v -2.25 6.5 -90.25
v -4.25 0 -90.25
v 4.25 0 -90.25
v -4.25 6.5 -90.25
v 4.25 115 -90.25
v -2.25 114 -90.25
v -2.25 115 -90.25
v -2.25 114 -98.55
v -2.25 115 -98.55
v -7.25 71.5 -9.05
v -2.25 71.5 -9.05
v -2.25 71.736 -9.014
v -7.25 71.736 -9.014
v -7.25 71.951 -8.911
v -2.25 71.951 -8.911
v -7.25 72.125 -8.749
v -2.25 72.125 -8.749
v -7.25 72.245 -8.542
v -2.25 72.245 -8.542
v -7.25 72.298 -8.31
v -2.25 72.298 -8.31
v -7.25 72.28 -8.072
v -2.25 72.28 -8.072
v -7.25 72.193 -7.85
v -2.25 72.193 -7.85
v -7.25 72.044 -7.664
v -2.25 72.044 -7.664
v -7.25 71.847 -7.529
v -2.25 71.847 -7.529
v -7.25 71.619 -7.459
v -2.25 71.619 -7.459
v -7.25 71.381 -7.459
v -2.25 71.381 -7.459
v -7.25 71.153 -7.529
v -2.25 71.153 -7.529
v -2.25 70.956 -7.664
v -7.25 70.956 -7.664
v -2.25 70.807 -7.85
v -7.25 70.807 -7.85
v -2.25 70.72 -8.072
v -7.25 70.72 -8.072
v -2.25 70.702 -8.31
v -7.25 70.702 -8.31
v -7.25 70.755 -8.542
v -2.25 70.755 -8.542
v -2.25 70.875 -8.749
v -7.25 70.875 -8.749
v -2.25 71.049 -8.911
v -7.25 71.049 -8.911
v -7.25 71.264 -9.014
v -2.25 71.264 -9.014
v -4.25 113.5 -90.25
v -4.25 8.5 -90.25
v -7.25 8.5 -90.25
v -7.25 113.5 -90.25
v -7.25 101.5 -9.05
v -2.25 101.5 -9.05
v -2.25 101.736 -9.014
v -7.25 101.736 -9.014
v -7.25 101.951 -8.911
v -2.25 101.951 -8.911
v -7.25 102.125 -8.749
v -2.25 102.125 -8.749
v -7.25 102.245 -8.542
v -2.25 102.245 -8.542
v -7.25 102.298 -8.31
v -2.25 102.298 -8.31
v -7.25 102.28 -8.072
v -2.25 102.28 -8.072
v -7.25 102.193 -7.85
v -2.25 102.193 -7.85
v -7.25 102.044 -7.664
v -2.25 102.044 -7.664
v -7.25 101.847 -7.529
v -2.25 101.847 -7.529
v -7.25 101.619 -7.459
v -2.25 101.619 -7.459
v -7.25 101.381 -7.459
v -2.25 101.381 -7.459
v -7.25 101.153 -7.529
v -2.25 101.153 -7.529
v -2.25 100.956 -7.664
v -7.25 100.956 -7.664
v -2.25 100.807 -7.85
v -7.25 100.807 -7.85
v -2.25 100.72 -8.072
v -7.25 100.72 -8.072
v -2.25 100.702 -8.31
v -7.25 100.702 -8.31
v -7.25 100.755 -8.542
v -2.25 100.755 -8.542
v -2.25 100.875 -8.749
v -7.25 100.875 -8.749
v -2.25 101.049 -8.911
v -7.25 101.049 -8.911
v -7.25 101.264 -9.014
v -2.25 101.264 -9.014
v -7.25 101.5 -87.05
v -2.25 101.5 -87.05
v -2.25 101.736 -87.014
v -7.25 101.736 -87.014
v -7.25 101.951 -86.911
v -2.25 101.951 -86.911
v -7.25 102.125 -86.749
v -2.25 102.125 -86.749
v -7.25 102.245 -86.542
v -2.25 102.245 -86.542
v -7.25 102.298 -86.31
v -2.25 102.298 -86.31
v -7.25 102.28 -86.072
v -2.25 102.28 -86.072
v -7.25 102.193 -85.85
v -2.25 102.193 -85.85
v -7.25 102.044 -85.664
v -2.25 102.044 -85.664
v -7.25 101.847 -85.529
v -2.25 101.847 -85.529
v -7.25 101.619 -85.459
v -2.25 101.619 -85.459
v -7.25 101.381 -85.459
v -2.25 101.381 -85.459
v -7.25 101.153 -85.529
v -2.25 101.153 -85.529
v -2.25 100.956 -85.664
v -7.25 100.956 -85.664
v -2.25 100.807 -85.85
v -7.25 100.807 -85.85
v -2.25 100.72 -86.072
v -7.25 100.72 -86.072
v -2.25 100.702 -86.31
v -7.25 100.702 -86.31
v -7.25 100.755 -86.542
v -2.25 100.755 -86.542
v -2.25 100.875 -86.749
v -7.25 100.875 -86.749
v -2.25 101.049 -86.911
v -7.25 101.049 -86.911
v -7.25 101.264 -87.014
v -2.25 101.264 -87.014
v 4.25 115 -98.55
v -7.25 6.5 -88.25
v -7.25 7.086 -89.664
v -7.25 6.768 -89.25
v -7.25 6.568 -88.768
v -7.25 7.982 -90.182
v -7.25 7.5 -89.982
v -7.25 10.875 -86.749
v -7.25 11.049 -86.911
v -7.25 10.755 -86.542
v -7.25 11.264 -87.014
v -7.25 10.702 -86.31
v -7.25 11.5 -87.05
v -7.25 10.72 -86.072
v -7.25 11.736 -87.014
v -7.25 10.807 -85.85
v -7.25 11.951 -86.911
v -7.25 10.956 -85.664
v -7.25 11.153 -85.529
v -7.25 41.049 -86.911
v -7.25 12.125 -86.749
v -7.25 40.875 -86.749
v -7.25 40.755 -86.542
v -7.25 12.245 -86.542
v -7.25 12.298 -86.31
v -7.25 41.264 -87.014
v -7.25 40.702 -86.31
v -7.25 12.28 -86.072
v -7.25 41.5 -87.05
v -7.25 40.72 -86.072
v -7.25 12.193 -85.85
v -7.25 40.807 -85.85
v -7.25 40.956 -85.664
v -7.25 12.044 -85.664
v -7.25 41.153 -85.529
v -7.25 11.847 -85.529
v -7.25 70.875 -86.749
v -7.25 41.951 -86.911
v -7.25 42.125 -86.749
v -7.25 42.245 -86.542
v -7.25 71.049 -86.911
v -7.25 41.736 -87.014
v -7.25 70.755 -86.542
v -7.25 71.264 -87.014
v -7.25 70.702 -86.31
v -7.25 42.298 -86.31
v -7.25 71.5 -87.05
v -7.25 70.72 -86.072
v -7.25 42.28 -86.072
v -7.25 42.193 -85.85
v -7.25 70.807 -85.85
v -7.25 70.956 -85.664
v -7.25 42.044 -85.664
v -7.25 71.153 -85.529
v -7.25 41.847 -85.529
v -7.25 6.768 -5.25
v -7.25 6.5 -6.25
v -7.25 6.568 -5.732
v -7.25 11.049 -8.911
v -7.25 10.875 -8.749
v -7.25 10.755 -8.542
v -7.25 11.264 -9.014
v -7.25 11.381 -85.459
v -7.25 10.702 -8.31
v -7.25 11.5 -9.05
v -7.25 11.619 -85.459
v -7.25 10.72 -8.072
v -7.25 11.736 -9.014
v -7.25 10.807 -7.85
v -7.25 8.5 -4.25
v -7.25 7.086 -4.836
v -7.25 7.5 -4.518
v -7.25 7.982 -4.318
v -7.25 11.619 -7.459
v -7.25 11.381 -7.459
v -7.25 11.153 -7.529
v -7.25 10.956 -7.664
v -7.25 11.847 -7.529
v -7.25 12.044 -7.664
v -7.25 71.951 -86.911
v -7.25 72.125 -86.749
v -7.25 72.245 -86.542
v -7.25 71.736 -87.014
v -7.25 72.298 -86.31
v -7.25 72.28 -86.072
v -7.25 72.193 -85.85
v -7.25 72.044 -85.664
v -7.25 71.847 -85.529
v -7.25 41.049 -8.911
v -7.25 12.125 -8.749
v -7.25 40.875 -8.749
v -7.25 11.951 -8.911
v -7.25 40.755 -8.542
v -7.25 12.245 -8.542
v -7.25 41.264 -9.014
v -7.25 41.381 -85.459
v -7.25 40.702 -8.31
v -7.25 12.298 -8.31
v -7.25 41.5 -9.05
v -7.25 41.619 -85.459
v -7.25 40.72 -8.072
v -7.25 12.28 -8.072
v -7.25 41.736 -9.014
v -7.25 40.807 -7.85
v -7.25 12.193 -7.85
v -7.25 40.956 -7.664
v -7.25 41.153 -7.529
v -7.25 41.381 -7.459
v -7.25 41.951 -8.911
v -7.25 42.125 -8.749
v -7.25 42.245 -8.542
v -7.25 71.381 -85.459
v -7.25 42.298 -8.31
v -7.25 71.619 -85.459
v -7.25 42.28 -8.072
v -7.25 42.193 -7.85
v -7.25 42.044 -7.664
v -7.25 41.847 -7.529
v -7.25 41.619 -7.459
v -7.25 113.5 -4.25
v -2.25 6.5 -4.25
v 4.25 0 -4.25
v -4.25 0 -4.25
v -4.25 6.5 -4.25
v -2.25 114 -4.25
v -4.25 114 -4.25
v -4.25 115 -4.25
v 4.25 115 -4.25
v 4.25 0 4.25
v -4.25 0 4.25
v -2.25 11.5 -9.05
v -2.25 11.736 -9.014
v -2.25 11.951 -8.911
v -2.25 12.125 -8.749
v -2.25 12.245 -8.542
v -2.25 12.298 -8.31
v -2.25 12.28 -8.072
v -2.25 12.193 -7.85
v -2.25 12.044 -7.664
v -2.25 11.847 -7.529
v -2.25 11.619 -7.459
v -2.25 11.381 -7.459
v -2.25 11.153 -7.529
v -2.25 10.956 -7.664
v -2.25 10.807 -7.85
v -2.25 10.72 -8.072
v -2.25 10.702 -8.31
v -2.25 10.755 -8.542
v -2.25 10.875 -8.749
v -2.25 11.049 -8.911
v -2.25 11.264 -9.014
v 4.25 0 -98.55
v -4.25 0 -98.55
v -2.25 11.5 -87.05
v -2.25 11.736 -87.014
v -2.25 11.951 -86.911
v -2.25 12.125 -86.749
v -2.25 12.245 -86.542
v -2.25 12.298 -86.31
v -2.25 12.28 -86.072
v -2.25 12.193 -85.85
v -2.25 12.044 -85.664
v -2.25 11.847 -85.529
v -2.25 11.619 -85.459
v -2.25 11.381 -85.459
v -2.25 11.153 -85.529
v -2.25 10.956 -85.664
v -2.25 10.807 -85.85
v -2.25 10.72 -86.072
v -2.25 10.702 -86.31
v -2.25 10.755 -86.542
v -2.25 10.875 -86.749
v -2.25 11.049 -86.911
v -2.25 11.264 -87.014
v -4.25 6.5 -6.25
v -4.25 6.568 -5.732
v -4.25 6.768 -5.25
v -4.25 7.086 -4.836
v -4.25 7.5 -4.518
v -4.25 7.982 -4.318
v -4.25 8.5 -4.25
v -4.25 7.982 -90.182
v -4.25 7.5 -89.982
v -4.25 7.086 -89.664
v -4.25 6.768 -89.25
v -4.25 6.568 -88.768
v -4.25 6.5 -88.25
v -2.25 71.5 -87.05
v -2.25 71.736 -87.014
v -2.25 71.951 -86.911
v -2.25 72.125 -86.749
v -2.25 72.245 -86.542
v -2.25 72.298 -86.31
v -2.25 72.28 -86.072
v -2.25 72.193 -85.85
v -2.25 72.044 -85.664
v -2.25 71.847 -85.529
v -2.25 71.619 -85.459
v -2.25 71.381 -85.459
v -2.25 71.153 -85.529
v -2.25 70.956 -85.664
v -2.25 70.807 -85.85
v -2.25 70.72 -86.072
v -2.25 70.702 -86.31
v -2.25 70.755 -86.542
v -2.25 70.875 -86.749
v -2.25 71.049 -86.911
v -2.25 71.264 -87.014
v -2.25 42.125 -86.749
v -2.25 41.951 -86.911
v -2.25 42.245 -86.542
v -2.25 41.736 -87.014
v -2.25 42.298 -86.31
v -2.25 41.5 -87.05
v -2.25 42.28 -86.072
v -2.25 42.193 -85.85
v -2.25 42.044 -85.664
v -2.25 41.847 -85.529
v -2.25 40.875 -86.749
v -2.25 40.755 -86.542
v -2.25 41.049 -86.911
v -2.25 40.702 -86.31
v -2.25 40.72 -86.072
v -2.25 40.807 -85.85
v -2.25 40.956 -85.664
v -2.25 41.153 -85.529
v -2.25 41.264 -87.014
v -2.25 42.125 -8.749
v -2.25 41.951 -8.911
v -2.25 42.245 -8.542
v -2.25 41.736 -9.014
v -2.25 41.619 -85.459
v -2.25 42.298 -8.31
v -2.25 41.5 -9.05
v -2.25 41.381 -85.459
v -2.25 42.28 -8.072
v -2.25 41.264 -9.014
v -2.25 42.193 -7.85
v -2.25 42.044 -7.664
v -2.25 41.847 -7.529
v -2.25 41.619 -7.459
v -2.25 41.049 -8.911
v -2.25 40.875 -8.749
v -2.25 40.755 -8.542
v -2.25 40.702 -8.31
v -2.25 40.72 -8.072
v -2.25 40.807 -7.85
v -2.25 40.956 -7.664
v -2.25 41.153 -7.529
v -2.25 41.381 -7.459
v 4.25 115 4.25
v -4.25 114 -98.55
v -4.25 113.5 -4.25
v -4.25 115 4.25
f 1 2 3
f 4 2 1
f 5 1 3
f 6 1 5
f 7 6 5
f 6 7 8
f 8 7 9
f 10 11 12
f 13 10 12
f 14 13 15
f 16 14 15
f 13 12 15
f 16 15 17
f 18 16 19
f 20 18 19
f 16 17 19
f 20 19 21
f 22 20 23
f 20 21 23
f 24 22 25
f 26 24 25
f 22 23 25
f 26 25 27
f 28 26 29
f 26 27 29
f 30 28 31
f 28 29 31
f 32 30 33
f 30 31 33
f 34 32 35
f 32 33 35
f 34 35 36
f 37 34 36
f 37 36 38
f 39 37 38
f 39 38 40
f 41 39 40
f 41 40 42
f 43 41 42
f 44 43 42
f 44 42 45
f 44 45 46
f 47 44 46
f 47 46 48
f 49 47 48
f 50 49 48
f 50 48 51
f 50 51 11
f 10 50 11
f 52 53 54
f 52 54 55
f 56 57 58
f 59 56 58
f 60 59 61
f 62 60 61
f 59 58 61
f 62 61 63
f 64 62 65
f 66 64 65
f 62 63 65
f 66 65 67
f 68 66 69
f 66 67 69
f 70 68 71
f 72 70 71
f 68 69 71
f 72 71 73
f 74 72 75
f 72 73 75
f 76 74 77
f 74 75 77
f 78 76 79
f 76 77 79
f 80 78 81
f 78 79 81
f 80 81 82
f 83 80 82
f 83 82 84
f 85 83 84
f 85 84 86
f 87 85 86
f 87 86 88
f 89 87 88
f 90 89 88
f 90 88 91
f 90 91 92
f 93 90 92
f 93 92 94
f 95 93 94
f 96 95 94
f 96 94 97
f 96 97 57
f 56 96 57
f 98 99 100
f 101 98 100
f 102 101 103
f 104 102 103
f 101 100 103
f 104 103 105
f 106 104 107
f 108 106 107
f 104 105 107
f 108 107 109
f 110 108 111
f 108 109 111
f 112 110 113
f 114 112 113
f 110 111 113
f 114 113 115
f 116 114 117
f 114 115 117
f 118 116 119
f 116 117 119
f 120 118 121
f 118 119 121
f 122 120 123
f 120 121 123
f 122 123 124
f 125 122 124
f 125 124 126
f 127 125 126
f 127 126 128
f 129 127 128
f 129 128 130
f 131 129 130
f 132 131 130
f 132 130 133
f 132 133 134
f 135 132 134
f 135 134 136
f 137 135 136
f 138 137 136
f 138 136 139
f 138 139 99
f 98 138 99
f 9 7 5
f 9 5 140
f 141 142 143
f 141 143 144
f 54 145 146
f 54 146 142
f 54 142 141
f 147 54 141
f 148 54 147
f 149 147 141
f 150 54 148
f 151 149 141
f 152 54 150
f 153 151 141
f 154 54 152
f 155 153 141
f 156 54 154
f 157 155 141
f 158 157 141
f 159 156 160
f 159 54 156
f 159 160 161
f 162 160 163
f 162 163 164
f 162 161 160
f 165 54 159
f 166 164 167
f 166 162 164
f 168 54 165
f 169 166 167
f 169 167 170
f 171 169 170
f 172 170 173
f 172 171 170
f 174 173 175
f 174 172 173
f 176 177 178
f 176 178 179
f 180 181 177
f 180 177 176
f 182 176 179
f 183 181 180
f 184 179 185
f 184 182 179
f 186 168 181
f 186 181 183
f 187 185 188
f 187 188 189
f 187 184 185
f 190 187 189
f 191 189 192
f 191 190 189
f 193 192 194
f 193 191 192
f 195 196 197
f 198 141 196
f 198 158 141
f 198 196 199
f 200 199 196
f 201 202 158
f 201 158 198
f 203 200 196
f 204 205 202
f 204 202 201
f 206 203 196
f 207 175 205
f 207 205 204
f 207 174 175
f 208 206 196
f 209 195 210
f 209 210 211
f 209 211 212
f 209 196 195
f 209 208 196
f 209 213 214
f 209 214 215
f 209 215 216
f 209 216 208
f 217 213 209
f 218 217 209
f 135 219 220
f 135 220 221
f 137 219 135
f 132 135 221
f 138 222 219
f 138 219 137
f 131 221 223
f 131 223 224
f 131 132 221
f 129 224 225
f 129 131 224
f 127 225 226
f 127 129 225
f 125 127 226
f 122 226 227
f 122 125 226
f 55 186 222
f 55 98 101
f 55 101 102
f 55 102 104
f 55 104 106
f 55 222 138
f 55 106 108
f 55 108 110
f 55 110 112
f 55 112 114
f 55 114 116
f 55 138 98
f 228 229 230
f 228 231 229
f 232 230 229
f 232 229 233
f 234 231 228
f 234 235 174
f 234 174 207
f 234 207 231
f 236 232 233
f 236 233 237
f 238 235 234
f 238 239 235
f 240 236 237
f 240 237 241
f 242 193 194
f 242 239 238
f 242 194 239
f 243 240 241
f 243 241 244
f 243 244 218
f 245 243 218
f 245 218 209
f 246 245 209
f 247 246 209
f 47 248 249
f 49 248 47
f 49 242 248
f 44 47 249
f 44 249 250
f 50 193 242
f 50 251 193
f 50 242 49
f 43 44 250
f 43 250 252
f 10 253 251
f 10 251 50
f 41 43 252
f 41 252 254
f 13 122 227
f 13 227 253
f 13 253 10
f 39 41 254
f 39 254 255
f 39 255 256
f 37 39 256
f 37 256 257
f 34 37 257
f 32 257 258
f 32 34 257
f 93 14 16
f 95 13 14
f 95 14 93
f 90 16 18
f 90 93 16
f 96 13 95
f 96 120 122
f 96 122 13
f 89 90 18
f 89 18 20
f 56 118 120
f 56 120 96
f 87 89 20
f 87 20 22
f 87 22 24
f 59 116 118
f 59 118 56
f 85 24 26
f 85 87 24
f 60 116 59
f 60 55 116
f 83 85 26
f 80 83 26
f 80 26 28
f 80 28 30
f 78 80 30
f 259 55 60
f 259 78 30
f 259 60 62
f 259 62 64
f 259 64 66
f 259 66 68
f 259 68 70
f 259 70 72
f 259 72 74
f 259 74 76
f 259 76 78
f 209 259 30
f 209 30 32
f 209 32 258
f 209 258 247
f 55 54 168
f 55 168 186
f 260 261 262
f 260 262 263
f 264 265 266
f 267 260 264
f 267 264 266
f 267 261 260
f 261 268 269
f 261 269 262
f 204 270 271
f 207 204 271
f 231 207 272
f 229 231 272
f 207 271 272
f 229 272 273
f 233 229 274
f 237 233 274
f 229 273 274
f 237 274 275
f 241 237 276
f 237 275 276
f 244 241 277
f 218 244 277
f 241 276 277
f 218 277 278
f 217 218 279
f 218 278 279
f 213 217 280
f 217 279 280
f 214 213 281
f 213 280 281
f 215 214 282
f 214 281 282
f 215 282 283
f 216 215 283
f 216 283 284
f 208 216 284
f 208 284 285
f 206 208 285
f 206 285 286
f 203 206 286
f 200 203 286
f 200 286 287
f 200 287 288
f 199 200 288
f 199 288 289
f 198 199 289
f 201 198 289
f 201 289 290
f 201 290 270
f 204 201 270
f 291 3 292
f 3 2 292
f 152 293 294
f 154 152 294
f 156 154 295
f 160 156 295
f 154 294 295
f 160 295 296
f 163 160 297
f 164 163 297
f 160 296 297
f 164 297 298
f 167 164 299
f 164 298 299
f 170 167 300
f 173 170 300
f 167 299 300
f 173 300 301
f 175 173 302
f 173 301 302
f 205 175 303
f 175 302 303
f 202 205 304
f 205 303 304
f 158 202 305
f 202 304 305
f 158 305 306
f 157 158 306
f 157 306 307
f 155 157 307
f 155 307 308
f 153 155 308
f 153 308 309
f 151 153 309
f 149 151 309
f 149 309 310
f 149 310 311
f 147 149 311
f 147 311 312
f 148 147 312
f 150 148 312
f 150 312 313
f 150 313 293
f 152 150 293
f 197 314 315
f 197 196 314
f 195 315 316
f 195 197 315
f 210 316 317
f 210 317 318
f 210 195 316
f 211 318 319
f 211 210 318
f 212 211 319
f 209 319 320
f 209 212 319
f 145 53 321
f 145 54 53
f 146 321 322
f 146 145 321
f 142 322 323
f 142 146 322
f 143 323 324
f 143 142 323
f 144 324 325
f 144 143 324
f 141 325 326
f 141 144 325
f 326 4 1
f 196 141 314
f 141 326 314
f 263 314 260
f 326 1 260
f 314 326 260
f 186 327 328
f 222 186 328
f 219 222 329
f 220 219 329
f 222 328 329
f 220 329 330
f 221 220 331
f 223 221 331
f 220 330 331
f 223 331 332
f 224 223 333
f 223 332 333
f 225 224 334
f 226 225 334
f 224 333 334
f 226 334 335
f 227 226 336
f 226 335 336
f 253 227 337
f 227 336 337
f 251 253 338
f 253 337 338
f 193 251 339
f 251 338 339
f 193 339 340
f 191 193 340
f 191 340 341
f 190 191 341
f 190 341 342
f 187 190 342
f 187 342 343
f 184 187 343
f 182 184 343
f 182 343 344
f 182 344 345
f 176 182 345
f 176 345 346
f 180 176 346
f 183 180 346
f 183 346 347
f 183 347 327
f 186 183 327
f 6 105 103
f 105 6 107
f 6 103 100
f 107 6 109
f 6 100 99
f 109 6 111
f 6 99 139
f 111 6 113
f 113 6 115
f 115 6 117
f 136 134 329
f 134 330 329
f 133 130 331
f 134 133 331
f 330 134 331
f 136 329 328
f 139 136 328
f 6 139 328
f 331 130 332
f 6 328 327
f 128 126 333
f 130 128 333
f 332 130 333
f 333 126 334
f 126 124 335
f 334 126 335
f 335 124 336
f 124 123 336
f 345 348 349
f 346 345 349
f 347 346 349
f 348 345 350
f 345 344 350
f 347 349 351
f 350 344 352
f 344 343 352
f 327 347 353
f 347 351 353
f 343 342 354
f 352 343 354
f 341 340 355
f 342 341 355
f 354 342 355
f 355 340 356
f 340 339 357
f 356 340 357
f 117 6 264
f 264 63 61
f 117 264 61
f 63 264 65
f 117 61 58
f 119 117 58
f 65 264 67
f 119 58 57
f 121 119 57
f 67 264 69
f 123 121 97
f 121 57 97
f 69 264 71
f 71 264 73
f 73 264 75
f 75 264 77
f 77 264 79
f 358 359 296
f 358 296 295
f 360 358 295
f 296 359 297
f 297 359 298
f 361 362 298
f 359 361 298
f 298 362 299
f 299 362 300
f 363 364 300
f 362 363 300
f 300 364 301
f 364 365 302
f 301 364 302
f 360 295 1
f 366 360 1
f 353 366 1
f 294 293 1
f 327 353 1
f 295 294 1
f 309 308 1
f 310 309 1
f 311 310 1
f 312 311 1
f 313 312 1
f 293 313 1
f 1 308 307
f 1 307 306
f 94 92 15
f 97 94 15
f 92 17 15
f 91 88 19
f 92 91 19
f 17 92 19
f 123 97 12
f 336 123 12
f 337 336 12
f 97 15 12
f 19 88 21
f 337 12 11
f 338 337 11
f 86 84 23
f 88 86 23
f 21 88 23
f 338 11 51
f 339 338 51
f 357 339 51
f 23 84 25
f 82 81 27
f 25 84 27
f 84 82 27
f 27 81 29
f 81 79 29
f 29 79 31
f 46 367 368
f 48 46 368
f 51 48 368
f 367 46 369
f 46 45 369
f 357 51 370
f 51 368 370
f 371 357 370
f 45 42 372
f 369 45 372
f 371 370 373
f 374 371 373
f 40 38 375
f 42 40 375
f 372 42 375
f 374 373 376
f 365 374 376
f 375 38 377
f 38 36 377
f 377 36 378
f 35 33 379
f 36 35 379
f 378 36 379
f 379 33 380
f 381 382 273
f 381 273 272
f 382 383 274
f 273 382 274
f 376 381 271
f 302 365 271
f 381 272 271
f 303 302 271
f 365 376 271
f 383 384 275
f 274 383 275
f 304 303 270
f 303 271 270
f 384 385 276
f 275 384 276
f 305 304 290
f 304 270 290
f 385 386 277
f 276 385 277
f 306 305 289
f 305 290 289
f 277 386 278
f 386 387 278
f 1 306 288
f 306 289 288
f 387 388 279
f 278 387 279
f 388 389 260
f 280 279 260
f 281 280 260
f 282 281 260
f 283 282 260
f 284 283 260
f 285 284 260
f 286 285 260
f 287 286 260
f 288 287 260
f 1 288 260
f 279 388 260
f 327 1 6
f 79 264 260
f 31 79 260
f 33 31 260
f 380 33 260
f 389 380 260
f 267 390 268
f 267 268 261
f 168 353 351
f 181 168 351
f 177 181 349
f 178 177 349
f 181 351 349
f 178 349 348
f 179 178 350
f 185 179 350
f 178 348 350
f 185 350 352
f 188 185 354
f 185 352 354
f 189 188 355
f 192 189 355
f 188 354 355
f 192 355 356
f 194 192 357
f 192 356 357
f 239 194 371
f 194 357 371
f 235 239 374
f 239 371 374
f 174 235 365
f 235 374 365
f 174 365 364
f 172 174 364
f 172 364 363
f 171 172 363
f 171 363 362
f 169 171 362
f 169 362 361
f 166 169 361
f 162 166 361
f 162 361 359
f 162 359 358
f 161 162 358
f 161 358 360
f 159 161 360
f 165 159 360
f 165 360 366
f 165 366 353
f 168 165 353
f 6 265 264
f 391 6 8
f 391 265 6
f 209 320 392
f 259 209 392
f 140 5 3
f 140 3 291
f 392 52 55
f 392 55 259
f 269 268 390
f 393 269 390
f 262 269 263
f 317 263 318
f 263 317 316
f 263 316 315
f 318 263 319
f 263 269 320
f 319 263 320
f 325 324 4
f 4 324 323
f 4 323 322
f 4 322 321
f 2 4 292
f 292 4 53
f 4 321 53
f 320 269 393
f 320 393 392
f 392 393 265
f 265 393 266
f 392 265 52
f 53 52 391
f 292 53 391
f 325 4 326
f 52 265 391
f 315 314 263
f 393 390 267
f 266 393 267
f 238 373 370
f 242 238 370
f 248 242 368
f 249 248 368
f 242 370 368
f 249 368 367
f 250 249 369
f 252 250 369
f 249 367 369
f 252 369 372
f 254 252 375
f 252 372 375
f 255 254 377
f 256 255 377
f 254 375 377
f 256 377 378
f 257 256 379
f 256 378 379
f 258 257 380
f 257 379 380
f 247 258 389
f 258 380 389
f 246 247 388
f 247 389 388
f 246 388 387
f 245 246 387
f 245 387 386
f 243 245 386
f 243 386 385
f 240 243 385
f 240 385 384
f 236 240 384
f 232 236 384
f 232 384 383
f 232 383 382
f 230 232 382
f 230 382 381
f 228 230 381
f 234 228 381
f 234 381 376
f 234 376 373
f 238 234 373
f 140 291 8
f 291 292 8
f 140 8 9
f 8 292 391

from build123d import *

# Parameters (mm, degrees)
SKETCH1_W             = 8.5
SKETCH1_H             = 115
BOSS_EXTRUDE1_DEPTH   = 8.5
BOSS_EXTRUDE2_DEPTH   = 2
SKETCH3_W             = 8.3
SKETCH3_H             = 115
BOSS_EXTRUDE3_DEPTH   = 6.5
SKETCH4_W             = 86
SKETCH4_H             = 107
BOSS_EXTRUDE4_DEPTH   = 3
SKETCH5_W             = 78
SKETCH5_H             = 99
CUT_EXTRUDE1_DEPTH    = 152.589420805
FILLET2_R             = 3
FILLET12_R            = 2
FILLET13_R            = 2
SKETCH64_W            = 78
SKETCH64_H            = 99
BOSS_EXTRUDE12_DEPTH  = 5
M2X0_4_TAPPED_HOLE1_D = 1.6


with BuildPart() as part:
    # Sketch1 → Boss-Extrude1 (new body)
    with BuildSketch(Plane(origin=(4.25, 0, 0), x_dir=(0, 0, -1), z_dir=(1, 0, 0))):
        with Locations((0, 57.5)):
            Rectangle(SKETCH1_W, SKETCH1_H)
    extrude(amount=-BOSS_EXTRUDE1_DEPTH)

    # Sketch2 → Boss-Extrude2 (add)
    with BuildSketch(Plane(origin=(-4.25, 0, 0), x_dir=(0, -1, 0), z_dir=(-1, 0, 0))):
        Polygon((-6.5, -90.25), (-6.5, -4.25), (-114, -4.25), (-114, -98.55), (0, -98.55), (0, -90.25), align=None)
    extrude(amount=-BOSS_EXTRUDE2_DEPTH)

    # Sketch3 → Boss-Extrude3 (add)
    with BuildSketch(Plane(origin=(-2.25, 0, 0), x_dir=(0, 0, -1), z_dir=(1, 0, 0))):
        with Locations((94.4, 57.5)):
            Rectangle(SKETCH3_W, SKETCH3_H)
    extrude(amount=BOSS_EXTRUDE3_DEPTH)

    # Sketch4 → Boss-Extrude4 (add)
    with BuildSketch(Plane.ZY.offset(4.25)):
        with Locations((-47.25, 60)):
            Rectangle(SKETCH4_W, SKETCH4_H)
    extrude(amount=BOSS_EXTRUDE4_DEPTH)

    # Sketch5 → Cut-Extrude1 (cut, through all)
    with BuildSketch(Plane(origin=(-2.25, 0, 0), x_dir=(0, 0, -1), z_dir=(1, 0, 0))):
        with Locations((47.25, 60)):
            Rectangle(SKETCH5_W, SKETCH5_H)
    extrude(amount=-CUT_EXTRUDE1_DEPTH, mode=Mode.SUBTRACT)

    # Fillet2
    fillet2_edges = [part.edges().sort_by_distance(p)[0] for p in [
        (-4.75, 10.5, -8.25),
        (-4.75, 109.5, -8.25),
        (-4.75, 109.5, -86.25),
        (-4.75, 10.5, -86.25),
    ]]
    fillet(fillet2_edges, radius=FILLET2_R)

    # Fillet12
    fillet12_edges = [part.edges().sort_by_distance(p)[0] for p in [
        (-5.75, 6.5, -90.25),
    ]]
    fillet(fillet12_edges, radius=FILLET12_R)

    # Fillet13
    fillet13_edges = [part.edges().sort_by_distance(p)[0] for p in [
        (-5.75, 6.5, -4.25),
    ]]
    fillet(fillet13_edges, radius=FILLET13_R)

    # Sketch64 → Boss-Extrude12 (add)
    with BuildSketch(Plane(origin=(-2.25, 0, 0), x_dir=(0, 0, -1), z_dir=(1, 0, 0))):
        with Locations((47.25, 60)):
            Rectangle(SKETCH64_W, SKETCH64_H)
    extrude(amount=-BOSS_EXTRUDE12_DEPTH)

    # M2x0.4 Tapped Hole1 (through all)
    with Locations(Plane.ZY.offset(7.25)):
        with Locations((-8.25, 11.5), (-8.25, 41.5), (-8.25, 71.5), (-8.25, 101.5), (-86.25, 11.5), (-86.25, 41.5), (-86.25, 71.5), (-86.25, 101.5)):
            Hole(M2X0_4_TAPPED_HOLE1_D / 2)


solid = part.part
